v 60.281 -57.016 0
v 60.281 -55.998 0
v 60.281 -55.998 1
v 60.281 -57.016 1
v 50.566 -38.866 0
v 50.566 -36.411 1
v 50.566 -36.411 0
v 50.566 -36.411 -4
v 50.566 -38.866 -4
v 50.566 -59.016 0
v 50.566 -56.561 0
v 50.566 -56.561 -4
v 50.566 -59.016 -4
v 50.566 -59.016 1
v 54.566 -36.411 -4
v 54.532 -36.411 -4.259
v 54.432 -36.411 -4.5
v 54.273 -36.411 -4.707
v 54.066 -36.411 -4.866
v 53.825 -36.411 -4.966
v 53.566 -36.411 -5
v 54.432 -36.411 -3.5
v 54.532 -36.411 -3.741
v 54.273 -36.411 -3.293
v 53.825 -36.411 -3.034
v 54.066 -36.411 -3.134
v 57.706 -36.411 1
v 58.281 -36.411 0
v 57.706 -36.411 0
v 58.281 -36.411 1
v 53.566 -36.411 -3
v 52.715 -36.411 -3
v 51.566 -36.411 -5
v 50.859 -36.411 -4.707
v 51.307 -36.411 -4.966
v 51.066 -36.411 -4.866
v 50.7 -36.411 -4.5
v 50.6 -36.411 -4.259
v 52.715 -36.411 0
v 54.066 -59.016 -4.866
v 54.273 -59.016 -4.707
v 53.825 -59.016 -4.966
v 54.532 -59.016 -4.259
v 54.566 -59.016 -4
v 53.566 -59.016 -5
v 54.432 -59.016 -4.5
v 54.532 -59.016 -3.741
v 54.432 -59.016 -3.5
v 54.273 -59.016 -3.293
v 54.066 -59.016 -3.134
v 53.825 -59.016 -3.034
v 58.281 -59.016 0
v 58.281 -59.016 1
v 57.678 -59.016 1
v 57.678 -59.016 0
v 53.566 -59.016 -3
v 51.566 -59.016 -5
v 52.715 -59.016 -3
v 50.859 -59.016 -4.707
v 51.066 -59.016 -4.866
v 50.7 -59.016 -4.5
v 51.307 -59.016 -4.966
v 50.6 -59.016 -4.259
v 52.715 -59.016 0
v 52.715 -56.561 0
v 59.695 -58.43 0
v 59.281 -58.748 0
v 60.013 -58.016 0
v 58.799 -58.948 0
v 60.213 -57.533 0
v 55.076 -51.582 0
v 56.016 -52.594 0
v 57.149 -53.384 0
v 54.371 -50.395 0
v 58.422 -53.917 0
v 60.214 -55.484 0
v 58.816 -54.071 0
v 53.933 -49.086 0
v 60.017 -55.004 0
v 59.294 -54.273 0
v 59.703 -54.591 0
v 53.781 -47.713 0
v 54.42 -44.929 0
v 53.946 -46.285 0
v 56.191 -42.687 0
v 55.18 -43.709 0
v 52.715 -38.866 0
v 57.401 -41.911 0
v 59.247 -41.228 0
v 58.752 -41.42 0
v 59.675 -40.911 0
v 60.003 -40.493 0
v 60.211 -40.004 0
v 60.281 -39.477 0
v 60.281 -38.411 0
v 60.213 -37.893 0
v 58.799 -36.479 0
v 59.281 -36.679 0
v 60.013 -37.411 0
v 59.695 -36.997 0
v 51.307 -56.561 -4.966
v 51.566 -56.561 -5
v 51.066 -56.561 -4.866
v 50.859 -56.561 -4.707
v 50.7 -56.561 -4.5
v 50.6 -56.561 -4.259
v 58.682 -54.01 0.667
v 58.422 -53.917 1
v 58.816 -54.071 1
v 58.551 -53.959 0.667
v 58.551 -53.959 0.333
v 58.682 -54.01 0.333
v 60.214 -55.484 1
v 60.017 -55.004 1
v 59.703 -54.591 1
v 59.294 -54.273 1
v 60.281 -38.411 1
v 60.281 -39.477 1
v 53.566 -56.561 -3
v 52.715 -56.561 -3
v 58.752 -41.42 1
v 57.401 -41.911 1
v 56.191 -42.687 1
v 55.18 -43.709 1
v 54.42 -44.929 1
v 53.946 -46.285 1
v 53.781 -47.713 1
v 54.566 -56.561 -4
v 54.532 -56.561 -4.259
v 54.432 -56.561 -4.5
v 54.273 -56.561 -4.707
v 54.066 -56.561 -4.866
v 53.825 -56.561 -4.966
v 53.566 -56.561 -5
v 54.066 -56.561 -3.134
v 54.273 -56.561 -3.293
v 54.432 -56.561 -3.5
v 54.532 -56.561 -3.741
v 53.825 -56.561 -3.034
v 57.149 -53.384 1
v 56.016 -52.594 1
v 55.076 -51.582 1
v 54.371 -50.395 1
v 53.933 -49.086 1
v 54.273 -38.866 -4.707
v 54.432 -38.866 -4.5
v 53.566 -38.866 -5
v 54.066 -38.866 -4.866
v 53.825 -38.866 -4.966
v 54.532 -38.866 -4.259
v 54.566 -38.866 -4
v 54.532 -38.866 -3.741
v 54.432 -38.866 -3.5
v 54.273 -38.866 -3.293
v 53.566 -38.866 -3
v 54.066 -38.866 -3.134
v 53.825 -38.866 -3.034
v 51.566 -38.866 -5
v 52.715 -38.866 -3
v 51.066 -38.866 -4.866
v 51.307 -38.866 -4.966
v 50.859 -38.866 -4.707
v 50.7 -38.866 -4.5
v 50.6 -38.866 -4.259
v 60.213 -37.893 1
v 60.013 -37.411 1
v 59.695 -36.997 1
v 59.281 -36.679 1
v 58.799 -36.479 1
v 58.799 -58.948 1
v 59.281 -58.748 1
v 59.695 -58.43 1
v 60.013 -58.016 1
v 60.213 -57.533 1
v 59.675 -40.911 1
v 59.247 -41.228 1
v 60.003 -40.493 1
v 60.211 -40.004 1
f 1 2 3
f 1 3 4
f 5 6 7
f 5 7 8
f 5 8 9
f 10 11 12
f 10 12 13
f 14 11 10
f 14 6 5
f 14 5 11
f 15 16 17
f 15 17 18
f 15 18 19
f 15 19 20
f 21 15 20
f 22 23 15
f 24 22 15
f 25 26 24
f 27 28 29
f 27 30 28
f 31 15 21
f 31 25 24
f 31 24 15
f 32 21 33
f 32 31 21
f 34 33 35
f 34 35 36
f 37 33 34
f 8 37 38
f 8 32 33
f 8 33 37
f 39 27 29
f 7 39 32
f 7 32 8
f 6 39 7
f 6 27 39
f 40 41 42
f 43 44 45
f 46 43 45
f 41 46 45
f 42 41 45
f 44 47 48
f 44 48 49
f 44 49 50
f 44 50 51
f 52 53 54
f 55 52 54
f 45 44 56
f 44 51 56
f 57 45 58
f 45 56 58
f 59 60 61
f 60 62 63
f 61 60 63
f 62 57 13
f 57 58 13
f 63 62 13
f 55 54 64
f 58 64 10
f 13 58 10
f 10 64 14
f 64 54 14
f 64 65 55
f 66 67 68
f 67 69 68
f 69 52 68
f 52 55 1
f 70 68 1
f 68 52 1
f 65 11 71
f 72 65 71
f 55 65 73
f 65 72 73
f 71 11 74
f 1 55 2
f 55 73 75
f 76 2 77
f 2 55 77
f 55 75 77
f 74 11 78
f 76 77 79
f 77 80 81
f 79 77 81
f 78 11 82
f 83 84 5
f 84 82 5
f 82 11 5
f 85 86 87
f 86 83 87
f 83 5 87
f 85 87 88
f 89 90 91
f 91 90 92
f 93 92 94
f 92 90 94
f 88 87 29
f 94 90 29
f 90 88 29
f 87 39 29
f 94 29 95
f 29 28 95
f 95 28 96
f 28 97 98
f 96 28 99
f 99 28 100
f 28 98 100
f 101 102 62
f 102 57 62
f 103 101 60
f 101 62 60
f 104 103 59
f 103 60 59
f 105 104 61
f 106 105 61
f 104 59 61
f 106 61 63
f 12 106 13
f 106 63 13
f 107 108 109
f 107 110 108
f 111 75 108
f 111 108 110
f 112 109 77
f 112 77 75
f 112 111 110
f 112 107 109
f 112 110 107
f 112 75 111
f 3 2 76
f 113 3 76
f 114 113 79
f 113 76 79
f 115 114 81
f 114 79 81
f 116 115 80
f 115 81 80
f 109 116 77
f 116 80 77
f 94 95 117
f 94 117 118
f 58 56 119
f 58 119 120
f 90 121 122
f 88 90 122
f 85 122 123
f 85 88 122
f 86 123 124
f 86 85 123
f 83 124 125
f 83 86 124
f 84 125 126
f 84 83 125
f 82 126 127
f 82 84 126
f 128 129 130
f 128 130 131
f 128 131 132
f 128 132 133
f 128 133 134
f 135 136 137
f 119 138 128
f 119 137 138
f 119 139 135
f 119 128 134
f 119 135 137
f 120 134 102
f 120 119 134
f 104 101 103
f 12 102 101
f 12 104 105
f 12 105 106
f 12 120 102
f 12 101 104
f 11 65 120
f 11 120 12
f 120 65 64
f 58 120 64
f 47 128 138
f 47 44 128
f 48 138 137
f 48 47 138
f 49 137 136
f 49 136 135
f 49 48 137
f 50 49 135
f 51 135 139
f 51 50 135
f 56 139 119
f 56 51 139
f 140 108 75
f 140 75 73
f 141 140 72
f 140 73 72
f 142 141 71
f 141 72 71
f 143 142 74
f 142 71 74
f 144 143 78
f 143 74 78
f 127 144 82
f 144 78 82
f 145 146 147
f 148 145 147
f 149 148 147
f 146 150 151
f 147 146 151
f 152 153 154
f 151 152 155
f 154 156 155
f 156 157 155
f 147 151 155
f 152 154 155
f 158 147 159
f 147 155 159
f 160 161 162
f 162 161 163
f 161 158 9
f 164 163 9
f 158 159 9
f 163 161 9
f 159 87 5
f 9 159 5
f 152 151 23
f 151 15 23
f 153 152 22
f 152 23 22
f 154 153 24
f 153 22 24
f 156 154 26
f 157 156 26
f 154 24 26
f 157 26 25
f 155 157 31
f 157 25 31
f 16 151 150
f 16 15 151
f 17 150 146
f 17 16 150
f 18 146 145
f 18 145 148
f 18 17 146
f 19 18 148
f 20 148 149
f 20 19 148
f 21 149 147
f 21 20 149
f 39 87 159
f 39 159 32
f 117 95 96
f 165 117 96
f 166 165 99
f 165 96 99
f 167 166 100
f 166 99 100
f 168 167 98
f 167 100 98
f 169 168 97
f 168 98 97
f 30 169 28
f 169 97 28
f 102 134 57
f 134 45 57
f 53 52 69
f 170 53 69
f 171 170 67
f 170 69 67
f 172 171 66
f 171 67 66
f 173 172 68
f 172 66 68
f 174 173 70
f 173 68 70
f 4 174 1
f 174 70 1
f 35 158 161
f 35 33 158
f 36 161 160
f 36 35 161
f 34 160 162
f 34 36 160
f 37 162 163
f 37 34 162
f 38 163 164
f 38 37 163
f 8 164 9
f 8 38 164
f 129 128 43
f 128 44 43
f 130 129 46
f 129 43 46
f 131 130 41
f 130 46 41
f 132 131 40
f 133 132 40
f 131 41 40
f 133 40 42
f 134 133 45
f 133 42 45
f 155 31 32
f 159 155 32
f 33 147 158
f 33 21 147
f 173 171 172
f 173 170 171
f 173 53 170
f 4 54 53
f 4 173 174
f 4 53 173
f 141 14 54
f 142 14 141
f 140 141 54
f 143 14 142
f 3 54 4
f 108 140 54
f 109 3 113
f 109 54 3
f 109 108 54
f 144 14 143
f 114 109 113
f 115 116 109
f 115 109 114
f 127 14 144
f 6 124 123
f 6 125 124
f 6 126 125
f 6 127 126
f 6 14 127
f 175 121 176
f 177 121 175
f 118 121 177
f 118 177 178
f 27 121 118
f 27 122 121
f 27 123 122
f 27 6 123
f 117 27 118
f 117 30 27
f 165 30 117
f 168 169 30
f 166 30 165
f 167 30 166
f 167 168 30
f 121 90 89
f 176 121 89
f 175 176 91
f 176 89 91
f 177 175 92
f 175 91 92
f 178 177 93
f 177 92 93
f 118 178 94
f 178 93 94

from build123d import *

# Parameters (mm, degrees)
BOSS_EXTRUDE1_DEPTH  = 1
FILLET1_START        = -1
FILLET1_DEPTH        = 3
FILLET2_START        = -1
FILLET2_DEPTH        = 3
SKETCH2_W            = 2.148941634
SKETCH2_H            = 2.454875289
BOSS_EXTRUDE2_DEPTH  = 4
SKETCH3_W            = 4
SKETCH3_H            = 2.454875289
BOSS_EXTRUDE3_DEPTH  = 2
FILLET3_R            = 1
FILLET3_OF_MIRROR1_R = 1
FILLET4_R            = 2


with BuildPart() as part:
    # Sketch1 → Boss-Extrude1 (new body)
    with BuildSketch(Plane.XY):
        with BuildLine():
            Line((50.566235294, -36.41094824), (50.566235294, -59.015823529))
            Line((50.566235294, -59.015823529), (60.281235294, -59.015823529))
            Line((60.281235294, -59.015823529), (60.281235294, -54.188823529))
            ThreePointArc((60.281235294, -54.188823529), (53.781235294, -47.688823529), (60.281235294, -41.188823529))
            Line((60.281235294, -41.188823529), (60.281235294, -36.41094824))
            Line((60.281235294, -36.41094824), (50.566235294, -36.41094824))
        make_face()
    boss_extrude1 = extrude(amount=BOSS_EXTRUDE1_DEPTH)

    # Fillet1: read off the stored shape, not the designer's step
    # Fillet1 outline → Fillet1 (cut)
    with BuildSketch(Plane.XY.offset(FILLET1_START)):
        with BuildLine():
            ThreePointArc((60.281235294, -54.188823529), (59.341877232, -54.12058895), (58.422241232, -53.917317816))
            add(Edge.make_bspline(
                [(58.422241232, -53.917317816), (59.442487987, -54.221826831), (60.281235188, -55.09507753), (60.281235294, -56.412193512)],
                knots=[0, 0, 0, 0, 0.45799037, 0.45799037, 0.45799037, 0.45799037], degree=3, weights=[1, 0.738797902, 0.597223849, 0.575277842]))
            Line((60.281235294, -56.412193512), (60.281235294, -54.188823529))
        make_face()
        with BuildLine():
            Line((60.281235294, -59.015823529), (60.281235294, -56.412193512))
            add(Edge.make_bspline(
                [(60.281235294, -56.412193512), (60.28123543, -58.106912276), (59.025045045, -59.01582353), (57.677605485, -59.015823529)],
                knots=[0.45799037, 0.45799037, 0.45799037, 0.45799037, 1, 1, 1, 1], degree=3, weights=[0.575277842, 0.549305795, 0.690879848, 1]))
            Line((57.677605485, -59.015823529), (60.281235294, -59.015823529))
        make_face()
    extrude(amount=FILLET1_DEPTH, mode=Mode.SUBTRACT)

    # Fillet2: read off the stored shape, not the designer's step
    # Fillet2 outline → Fillet2 (cut)
    with BuildSketch(Plane.XY.offset(FILLET2_START)):
        with BuildLine():
            Line((60.281235294, -36.41094824), (57.705740699, -36.41094824))
            add(Edge.make_bspline(
                [(57.705740699, -36.41094824), (59.038271524, -36.41094824), (60.281235294, -37.309720888), (60.281235294, -38.986442835)],
                knots=[0, 0, 0, 0, 0.541625397, 0.541625397, 0.541625397, 0.541625397], degree=3, weights=[1, 0.690686422, 0.548904933, 0.574655534]))
            Line((60.281235294, -38.986442835), (60.281235294, -36.41094824))
        make_face()
        with BuildLine():
            Line((60.281235294, -41.188823529), (60.281235294, -38.986442835))
            add(Edge.make_bspline(
                [(60.281235294, -38.986442835), (60.281235295, -40.292334143), (59.448338906, -41.156634612), (58.436628954, -41.456053082)],
                knots=[0.541625397, 0.541625397, 0.541625397, 0.541625397, 1, 1, 1, 1], degree=3, weights=[0.574655534, 0.596448126, 0.738229615, 1]))
            ThreePointArc((58.436628954, -41.456053082), (59.349303941, -41.255977817), (60.281235294, -41.188823529))
        make_face()
    extrude(amount=FILLET2_DEPTH, mode=Mode.SUBTRACT)

    # Sketch2 → Boss-Extrude2 (add)
    with BuildSketch(Plane.XY.offset(1)):
        with Locations((51.640706111, -37.638385885)):
            Rectangle(SKETCH2_W, SKETCH2_H)
    boss_extrude2 = extrude(amount=-BOSS_EXTRUDE2_DEPTH)

    # Sketch3 → Boss-Extrude3 (add)
    with BuildSketch(Plane(origin=(0, 0, -3), x_dir=(-1, 0, 0), z_dir=(0, 0, -1))):
        with Locations((-52.566235294, -37.638385885)):
            Rectangle(SKETCH3_W, SKETCH3_H)
    boss_extrude3 = extrude(amount=BOSS_EXTRUDE3_DEPTH)

    # Fillet3
    fillet3_edges = [part.edges().sort_by_distance(p)[0] for p in [
        (54.566235294, -37.638385885, -3),
        (54.566235294, -37.638385885, -5),
        (50.566235294, -37.638385885, -5),
    ]]
    fillet(fillet3_edges, radius=FILLET3_R - 0.0001)  # a hair under: the kernel refuses the full size

    # Mirror1: Boss-Extrude1, Boss-Extrude2, Boss-Extrude3 across plane
    add(boss_extrude1.mirror(Plane.ZX.offset(-47.713385885)))
    add(boss_extrude2.mirror(Plane.ZX.offset(-47.713385885)))
    add(boss_extrude3.mirror(Plane.ZX.offset(-47.713385885)))

    # Fillet3 of Mirror1
    fillet3_of_mirror1_edges = [part.edges().sort_by_distance(p)[0] for p in [
        (54.566235294, -57.788385885, -3),
        (54.566235294, -57.788385885, -5),
        (50.566235294, -57.788385885, -5),
    ]]
    fillet(fillet3_of_mirror1_edges, radius=FILLET3_OF_MIRROR1_R - 0.0001)  # a hair under: the kernel refuses the full size

    # Fillet4
    # the kernel refuses this fillet: 2 mm, written as the material it takes off along each edge
    with BuildSketch(Plane(origin=(60.281235294, -41.23794824, -4.403389552), x_dir=(0, 1, 0), z_dir=(0, 0, 1))) as fillet4_piece_1:
        with BuildLine():
            CenterArc((1.761355821, 2), FILLET4_R, 193.608960631, 76.391039369)
            Line((-0.182492608, 1.529411765), (-0.221369576, 1.52))
            ThreePointArc((-0.221369576, 1.52), (-0.085502649, 0.765391227), (-0.04, 0))
            Line((-0.04, 0), (0, -0.04))
            Line((0, -0.04), (1.761355821, -0.04))
            Line((1.761355821, -0.04), (1.761355821, 0))
        make_face()
    extrude(amount=9.806779105, mode=Mode.SUBTRACT)
    with BuildSketch(Plane(origin=(60.281235294, -36.41094824, -5), x_dir=(-1, 0, 0), z_dir=(0, 0, 1))) as fillet4_piece_2:
        with BuildLine():
            CenterArc((FILLET4_R, FILLET4_R), FILLET4_R, 180, 90)
            Line((0, FILLET4_R), (-FILLET4_R * 0.02, FILLET4_R))
            Line((-FILLET4_R * 0.02, FILLET4_R), (-FILLET4_R * 0.02, -FILLET4_R * 0.02))
            Line((-FILLET4_R * 0.02, -FILLET4_R * 0.02), (FILLET4_R, -FILLET4_R * 0.02))
            Line((FILLET4_R, -FILLET4_R * 0.02), (FILLET4_R, 0))
        make_face()
    extrude(amount=11, mode=Mode.SUBTRACT)
    with BuildSketch(Plane(origin=(60.281235294, -59.015823529, -5), x_dir=(-1, 0, 0), z_dir=(0, 0, 1))) as fillet4_piece_3:
        with BuildLine():
            CenterArc((FILLET4_R, -FILLET4_R), FILLET4_R, 90, 90)
            Line((0, -FILLET4_R), (-FILLET4_R * 0.02, -FILLET4_R))
            Line((-FILLET4_R * 0.02, -FILLET4_R), (-FILLET4_R * 0.02, FILLET4_R * 0.02))
            Line((-FILLET4_R * 0.02, FILLET4_R * 0.02), (FILLET4_R, FILLET4_R * 0.02))
            Line((FILLET4_R, FILLET4_R * 0.02), (FILLET4_R, 0))
        make_face()
    extrude(amount=11, mode=Mode.SUBTRACT)
    with BuildSketch(Plane(origin=(60.281235294, -54.23794824, -4.399691242), x_dir=(0, -1, 0), z_dir=(0, 0, 1))) as fillet4_piece_4:
        with BuildLine():
            CenterArc((1.759876497, -2), FILLET4_R, 90, 74.48871178)
            Line((-0.167279071, -1.465143556), (-0.205822183, -1.454446427))
            ThreePointArc((-0.205822183, -1.454446427), (-0.081696985, -0.732793564), (-0.04, 0))
            Line((-0.04, 0), (0, 0.04))
            Line((0, 0.04), (1.759876497, 0.04))
            Line((1.759876497, 0.04), (1.759876497, 0))
        make_face()
    extrude(amount=9.799382485, mode=Mode.SUBTRACT)


solid = part.part
